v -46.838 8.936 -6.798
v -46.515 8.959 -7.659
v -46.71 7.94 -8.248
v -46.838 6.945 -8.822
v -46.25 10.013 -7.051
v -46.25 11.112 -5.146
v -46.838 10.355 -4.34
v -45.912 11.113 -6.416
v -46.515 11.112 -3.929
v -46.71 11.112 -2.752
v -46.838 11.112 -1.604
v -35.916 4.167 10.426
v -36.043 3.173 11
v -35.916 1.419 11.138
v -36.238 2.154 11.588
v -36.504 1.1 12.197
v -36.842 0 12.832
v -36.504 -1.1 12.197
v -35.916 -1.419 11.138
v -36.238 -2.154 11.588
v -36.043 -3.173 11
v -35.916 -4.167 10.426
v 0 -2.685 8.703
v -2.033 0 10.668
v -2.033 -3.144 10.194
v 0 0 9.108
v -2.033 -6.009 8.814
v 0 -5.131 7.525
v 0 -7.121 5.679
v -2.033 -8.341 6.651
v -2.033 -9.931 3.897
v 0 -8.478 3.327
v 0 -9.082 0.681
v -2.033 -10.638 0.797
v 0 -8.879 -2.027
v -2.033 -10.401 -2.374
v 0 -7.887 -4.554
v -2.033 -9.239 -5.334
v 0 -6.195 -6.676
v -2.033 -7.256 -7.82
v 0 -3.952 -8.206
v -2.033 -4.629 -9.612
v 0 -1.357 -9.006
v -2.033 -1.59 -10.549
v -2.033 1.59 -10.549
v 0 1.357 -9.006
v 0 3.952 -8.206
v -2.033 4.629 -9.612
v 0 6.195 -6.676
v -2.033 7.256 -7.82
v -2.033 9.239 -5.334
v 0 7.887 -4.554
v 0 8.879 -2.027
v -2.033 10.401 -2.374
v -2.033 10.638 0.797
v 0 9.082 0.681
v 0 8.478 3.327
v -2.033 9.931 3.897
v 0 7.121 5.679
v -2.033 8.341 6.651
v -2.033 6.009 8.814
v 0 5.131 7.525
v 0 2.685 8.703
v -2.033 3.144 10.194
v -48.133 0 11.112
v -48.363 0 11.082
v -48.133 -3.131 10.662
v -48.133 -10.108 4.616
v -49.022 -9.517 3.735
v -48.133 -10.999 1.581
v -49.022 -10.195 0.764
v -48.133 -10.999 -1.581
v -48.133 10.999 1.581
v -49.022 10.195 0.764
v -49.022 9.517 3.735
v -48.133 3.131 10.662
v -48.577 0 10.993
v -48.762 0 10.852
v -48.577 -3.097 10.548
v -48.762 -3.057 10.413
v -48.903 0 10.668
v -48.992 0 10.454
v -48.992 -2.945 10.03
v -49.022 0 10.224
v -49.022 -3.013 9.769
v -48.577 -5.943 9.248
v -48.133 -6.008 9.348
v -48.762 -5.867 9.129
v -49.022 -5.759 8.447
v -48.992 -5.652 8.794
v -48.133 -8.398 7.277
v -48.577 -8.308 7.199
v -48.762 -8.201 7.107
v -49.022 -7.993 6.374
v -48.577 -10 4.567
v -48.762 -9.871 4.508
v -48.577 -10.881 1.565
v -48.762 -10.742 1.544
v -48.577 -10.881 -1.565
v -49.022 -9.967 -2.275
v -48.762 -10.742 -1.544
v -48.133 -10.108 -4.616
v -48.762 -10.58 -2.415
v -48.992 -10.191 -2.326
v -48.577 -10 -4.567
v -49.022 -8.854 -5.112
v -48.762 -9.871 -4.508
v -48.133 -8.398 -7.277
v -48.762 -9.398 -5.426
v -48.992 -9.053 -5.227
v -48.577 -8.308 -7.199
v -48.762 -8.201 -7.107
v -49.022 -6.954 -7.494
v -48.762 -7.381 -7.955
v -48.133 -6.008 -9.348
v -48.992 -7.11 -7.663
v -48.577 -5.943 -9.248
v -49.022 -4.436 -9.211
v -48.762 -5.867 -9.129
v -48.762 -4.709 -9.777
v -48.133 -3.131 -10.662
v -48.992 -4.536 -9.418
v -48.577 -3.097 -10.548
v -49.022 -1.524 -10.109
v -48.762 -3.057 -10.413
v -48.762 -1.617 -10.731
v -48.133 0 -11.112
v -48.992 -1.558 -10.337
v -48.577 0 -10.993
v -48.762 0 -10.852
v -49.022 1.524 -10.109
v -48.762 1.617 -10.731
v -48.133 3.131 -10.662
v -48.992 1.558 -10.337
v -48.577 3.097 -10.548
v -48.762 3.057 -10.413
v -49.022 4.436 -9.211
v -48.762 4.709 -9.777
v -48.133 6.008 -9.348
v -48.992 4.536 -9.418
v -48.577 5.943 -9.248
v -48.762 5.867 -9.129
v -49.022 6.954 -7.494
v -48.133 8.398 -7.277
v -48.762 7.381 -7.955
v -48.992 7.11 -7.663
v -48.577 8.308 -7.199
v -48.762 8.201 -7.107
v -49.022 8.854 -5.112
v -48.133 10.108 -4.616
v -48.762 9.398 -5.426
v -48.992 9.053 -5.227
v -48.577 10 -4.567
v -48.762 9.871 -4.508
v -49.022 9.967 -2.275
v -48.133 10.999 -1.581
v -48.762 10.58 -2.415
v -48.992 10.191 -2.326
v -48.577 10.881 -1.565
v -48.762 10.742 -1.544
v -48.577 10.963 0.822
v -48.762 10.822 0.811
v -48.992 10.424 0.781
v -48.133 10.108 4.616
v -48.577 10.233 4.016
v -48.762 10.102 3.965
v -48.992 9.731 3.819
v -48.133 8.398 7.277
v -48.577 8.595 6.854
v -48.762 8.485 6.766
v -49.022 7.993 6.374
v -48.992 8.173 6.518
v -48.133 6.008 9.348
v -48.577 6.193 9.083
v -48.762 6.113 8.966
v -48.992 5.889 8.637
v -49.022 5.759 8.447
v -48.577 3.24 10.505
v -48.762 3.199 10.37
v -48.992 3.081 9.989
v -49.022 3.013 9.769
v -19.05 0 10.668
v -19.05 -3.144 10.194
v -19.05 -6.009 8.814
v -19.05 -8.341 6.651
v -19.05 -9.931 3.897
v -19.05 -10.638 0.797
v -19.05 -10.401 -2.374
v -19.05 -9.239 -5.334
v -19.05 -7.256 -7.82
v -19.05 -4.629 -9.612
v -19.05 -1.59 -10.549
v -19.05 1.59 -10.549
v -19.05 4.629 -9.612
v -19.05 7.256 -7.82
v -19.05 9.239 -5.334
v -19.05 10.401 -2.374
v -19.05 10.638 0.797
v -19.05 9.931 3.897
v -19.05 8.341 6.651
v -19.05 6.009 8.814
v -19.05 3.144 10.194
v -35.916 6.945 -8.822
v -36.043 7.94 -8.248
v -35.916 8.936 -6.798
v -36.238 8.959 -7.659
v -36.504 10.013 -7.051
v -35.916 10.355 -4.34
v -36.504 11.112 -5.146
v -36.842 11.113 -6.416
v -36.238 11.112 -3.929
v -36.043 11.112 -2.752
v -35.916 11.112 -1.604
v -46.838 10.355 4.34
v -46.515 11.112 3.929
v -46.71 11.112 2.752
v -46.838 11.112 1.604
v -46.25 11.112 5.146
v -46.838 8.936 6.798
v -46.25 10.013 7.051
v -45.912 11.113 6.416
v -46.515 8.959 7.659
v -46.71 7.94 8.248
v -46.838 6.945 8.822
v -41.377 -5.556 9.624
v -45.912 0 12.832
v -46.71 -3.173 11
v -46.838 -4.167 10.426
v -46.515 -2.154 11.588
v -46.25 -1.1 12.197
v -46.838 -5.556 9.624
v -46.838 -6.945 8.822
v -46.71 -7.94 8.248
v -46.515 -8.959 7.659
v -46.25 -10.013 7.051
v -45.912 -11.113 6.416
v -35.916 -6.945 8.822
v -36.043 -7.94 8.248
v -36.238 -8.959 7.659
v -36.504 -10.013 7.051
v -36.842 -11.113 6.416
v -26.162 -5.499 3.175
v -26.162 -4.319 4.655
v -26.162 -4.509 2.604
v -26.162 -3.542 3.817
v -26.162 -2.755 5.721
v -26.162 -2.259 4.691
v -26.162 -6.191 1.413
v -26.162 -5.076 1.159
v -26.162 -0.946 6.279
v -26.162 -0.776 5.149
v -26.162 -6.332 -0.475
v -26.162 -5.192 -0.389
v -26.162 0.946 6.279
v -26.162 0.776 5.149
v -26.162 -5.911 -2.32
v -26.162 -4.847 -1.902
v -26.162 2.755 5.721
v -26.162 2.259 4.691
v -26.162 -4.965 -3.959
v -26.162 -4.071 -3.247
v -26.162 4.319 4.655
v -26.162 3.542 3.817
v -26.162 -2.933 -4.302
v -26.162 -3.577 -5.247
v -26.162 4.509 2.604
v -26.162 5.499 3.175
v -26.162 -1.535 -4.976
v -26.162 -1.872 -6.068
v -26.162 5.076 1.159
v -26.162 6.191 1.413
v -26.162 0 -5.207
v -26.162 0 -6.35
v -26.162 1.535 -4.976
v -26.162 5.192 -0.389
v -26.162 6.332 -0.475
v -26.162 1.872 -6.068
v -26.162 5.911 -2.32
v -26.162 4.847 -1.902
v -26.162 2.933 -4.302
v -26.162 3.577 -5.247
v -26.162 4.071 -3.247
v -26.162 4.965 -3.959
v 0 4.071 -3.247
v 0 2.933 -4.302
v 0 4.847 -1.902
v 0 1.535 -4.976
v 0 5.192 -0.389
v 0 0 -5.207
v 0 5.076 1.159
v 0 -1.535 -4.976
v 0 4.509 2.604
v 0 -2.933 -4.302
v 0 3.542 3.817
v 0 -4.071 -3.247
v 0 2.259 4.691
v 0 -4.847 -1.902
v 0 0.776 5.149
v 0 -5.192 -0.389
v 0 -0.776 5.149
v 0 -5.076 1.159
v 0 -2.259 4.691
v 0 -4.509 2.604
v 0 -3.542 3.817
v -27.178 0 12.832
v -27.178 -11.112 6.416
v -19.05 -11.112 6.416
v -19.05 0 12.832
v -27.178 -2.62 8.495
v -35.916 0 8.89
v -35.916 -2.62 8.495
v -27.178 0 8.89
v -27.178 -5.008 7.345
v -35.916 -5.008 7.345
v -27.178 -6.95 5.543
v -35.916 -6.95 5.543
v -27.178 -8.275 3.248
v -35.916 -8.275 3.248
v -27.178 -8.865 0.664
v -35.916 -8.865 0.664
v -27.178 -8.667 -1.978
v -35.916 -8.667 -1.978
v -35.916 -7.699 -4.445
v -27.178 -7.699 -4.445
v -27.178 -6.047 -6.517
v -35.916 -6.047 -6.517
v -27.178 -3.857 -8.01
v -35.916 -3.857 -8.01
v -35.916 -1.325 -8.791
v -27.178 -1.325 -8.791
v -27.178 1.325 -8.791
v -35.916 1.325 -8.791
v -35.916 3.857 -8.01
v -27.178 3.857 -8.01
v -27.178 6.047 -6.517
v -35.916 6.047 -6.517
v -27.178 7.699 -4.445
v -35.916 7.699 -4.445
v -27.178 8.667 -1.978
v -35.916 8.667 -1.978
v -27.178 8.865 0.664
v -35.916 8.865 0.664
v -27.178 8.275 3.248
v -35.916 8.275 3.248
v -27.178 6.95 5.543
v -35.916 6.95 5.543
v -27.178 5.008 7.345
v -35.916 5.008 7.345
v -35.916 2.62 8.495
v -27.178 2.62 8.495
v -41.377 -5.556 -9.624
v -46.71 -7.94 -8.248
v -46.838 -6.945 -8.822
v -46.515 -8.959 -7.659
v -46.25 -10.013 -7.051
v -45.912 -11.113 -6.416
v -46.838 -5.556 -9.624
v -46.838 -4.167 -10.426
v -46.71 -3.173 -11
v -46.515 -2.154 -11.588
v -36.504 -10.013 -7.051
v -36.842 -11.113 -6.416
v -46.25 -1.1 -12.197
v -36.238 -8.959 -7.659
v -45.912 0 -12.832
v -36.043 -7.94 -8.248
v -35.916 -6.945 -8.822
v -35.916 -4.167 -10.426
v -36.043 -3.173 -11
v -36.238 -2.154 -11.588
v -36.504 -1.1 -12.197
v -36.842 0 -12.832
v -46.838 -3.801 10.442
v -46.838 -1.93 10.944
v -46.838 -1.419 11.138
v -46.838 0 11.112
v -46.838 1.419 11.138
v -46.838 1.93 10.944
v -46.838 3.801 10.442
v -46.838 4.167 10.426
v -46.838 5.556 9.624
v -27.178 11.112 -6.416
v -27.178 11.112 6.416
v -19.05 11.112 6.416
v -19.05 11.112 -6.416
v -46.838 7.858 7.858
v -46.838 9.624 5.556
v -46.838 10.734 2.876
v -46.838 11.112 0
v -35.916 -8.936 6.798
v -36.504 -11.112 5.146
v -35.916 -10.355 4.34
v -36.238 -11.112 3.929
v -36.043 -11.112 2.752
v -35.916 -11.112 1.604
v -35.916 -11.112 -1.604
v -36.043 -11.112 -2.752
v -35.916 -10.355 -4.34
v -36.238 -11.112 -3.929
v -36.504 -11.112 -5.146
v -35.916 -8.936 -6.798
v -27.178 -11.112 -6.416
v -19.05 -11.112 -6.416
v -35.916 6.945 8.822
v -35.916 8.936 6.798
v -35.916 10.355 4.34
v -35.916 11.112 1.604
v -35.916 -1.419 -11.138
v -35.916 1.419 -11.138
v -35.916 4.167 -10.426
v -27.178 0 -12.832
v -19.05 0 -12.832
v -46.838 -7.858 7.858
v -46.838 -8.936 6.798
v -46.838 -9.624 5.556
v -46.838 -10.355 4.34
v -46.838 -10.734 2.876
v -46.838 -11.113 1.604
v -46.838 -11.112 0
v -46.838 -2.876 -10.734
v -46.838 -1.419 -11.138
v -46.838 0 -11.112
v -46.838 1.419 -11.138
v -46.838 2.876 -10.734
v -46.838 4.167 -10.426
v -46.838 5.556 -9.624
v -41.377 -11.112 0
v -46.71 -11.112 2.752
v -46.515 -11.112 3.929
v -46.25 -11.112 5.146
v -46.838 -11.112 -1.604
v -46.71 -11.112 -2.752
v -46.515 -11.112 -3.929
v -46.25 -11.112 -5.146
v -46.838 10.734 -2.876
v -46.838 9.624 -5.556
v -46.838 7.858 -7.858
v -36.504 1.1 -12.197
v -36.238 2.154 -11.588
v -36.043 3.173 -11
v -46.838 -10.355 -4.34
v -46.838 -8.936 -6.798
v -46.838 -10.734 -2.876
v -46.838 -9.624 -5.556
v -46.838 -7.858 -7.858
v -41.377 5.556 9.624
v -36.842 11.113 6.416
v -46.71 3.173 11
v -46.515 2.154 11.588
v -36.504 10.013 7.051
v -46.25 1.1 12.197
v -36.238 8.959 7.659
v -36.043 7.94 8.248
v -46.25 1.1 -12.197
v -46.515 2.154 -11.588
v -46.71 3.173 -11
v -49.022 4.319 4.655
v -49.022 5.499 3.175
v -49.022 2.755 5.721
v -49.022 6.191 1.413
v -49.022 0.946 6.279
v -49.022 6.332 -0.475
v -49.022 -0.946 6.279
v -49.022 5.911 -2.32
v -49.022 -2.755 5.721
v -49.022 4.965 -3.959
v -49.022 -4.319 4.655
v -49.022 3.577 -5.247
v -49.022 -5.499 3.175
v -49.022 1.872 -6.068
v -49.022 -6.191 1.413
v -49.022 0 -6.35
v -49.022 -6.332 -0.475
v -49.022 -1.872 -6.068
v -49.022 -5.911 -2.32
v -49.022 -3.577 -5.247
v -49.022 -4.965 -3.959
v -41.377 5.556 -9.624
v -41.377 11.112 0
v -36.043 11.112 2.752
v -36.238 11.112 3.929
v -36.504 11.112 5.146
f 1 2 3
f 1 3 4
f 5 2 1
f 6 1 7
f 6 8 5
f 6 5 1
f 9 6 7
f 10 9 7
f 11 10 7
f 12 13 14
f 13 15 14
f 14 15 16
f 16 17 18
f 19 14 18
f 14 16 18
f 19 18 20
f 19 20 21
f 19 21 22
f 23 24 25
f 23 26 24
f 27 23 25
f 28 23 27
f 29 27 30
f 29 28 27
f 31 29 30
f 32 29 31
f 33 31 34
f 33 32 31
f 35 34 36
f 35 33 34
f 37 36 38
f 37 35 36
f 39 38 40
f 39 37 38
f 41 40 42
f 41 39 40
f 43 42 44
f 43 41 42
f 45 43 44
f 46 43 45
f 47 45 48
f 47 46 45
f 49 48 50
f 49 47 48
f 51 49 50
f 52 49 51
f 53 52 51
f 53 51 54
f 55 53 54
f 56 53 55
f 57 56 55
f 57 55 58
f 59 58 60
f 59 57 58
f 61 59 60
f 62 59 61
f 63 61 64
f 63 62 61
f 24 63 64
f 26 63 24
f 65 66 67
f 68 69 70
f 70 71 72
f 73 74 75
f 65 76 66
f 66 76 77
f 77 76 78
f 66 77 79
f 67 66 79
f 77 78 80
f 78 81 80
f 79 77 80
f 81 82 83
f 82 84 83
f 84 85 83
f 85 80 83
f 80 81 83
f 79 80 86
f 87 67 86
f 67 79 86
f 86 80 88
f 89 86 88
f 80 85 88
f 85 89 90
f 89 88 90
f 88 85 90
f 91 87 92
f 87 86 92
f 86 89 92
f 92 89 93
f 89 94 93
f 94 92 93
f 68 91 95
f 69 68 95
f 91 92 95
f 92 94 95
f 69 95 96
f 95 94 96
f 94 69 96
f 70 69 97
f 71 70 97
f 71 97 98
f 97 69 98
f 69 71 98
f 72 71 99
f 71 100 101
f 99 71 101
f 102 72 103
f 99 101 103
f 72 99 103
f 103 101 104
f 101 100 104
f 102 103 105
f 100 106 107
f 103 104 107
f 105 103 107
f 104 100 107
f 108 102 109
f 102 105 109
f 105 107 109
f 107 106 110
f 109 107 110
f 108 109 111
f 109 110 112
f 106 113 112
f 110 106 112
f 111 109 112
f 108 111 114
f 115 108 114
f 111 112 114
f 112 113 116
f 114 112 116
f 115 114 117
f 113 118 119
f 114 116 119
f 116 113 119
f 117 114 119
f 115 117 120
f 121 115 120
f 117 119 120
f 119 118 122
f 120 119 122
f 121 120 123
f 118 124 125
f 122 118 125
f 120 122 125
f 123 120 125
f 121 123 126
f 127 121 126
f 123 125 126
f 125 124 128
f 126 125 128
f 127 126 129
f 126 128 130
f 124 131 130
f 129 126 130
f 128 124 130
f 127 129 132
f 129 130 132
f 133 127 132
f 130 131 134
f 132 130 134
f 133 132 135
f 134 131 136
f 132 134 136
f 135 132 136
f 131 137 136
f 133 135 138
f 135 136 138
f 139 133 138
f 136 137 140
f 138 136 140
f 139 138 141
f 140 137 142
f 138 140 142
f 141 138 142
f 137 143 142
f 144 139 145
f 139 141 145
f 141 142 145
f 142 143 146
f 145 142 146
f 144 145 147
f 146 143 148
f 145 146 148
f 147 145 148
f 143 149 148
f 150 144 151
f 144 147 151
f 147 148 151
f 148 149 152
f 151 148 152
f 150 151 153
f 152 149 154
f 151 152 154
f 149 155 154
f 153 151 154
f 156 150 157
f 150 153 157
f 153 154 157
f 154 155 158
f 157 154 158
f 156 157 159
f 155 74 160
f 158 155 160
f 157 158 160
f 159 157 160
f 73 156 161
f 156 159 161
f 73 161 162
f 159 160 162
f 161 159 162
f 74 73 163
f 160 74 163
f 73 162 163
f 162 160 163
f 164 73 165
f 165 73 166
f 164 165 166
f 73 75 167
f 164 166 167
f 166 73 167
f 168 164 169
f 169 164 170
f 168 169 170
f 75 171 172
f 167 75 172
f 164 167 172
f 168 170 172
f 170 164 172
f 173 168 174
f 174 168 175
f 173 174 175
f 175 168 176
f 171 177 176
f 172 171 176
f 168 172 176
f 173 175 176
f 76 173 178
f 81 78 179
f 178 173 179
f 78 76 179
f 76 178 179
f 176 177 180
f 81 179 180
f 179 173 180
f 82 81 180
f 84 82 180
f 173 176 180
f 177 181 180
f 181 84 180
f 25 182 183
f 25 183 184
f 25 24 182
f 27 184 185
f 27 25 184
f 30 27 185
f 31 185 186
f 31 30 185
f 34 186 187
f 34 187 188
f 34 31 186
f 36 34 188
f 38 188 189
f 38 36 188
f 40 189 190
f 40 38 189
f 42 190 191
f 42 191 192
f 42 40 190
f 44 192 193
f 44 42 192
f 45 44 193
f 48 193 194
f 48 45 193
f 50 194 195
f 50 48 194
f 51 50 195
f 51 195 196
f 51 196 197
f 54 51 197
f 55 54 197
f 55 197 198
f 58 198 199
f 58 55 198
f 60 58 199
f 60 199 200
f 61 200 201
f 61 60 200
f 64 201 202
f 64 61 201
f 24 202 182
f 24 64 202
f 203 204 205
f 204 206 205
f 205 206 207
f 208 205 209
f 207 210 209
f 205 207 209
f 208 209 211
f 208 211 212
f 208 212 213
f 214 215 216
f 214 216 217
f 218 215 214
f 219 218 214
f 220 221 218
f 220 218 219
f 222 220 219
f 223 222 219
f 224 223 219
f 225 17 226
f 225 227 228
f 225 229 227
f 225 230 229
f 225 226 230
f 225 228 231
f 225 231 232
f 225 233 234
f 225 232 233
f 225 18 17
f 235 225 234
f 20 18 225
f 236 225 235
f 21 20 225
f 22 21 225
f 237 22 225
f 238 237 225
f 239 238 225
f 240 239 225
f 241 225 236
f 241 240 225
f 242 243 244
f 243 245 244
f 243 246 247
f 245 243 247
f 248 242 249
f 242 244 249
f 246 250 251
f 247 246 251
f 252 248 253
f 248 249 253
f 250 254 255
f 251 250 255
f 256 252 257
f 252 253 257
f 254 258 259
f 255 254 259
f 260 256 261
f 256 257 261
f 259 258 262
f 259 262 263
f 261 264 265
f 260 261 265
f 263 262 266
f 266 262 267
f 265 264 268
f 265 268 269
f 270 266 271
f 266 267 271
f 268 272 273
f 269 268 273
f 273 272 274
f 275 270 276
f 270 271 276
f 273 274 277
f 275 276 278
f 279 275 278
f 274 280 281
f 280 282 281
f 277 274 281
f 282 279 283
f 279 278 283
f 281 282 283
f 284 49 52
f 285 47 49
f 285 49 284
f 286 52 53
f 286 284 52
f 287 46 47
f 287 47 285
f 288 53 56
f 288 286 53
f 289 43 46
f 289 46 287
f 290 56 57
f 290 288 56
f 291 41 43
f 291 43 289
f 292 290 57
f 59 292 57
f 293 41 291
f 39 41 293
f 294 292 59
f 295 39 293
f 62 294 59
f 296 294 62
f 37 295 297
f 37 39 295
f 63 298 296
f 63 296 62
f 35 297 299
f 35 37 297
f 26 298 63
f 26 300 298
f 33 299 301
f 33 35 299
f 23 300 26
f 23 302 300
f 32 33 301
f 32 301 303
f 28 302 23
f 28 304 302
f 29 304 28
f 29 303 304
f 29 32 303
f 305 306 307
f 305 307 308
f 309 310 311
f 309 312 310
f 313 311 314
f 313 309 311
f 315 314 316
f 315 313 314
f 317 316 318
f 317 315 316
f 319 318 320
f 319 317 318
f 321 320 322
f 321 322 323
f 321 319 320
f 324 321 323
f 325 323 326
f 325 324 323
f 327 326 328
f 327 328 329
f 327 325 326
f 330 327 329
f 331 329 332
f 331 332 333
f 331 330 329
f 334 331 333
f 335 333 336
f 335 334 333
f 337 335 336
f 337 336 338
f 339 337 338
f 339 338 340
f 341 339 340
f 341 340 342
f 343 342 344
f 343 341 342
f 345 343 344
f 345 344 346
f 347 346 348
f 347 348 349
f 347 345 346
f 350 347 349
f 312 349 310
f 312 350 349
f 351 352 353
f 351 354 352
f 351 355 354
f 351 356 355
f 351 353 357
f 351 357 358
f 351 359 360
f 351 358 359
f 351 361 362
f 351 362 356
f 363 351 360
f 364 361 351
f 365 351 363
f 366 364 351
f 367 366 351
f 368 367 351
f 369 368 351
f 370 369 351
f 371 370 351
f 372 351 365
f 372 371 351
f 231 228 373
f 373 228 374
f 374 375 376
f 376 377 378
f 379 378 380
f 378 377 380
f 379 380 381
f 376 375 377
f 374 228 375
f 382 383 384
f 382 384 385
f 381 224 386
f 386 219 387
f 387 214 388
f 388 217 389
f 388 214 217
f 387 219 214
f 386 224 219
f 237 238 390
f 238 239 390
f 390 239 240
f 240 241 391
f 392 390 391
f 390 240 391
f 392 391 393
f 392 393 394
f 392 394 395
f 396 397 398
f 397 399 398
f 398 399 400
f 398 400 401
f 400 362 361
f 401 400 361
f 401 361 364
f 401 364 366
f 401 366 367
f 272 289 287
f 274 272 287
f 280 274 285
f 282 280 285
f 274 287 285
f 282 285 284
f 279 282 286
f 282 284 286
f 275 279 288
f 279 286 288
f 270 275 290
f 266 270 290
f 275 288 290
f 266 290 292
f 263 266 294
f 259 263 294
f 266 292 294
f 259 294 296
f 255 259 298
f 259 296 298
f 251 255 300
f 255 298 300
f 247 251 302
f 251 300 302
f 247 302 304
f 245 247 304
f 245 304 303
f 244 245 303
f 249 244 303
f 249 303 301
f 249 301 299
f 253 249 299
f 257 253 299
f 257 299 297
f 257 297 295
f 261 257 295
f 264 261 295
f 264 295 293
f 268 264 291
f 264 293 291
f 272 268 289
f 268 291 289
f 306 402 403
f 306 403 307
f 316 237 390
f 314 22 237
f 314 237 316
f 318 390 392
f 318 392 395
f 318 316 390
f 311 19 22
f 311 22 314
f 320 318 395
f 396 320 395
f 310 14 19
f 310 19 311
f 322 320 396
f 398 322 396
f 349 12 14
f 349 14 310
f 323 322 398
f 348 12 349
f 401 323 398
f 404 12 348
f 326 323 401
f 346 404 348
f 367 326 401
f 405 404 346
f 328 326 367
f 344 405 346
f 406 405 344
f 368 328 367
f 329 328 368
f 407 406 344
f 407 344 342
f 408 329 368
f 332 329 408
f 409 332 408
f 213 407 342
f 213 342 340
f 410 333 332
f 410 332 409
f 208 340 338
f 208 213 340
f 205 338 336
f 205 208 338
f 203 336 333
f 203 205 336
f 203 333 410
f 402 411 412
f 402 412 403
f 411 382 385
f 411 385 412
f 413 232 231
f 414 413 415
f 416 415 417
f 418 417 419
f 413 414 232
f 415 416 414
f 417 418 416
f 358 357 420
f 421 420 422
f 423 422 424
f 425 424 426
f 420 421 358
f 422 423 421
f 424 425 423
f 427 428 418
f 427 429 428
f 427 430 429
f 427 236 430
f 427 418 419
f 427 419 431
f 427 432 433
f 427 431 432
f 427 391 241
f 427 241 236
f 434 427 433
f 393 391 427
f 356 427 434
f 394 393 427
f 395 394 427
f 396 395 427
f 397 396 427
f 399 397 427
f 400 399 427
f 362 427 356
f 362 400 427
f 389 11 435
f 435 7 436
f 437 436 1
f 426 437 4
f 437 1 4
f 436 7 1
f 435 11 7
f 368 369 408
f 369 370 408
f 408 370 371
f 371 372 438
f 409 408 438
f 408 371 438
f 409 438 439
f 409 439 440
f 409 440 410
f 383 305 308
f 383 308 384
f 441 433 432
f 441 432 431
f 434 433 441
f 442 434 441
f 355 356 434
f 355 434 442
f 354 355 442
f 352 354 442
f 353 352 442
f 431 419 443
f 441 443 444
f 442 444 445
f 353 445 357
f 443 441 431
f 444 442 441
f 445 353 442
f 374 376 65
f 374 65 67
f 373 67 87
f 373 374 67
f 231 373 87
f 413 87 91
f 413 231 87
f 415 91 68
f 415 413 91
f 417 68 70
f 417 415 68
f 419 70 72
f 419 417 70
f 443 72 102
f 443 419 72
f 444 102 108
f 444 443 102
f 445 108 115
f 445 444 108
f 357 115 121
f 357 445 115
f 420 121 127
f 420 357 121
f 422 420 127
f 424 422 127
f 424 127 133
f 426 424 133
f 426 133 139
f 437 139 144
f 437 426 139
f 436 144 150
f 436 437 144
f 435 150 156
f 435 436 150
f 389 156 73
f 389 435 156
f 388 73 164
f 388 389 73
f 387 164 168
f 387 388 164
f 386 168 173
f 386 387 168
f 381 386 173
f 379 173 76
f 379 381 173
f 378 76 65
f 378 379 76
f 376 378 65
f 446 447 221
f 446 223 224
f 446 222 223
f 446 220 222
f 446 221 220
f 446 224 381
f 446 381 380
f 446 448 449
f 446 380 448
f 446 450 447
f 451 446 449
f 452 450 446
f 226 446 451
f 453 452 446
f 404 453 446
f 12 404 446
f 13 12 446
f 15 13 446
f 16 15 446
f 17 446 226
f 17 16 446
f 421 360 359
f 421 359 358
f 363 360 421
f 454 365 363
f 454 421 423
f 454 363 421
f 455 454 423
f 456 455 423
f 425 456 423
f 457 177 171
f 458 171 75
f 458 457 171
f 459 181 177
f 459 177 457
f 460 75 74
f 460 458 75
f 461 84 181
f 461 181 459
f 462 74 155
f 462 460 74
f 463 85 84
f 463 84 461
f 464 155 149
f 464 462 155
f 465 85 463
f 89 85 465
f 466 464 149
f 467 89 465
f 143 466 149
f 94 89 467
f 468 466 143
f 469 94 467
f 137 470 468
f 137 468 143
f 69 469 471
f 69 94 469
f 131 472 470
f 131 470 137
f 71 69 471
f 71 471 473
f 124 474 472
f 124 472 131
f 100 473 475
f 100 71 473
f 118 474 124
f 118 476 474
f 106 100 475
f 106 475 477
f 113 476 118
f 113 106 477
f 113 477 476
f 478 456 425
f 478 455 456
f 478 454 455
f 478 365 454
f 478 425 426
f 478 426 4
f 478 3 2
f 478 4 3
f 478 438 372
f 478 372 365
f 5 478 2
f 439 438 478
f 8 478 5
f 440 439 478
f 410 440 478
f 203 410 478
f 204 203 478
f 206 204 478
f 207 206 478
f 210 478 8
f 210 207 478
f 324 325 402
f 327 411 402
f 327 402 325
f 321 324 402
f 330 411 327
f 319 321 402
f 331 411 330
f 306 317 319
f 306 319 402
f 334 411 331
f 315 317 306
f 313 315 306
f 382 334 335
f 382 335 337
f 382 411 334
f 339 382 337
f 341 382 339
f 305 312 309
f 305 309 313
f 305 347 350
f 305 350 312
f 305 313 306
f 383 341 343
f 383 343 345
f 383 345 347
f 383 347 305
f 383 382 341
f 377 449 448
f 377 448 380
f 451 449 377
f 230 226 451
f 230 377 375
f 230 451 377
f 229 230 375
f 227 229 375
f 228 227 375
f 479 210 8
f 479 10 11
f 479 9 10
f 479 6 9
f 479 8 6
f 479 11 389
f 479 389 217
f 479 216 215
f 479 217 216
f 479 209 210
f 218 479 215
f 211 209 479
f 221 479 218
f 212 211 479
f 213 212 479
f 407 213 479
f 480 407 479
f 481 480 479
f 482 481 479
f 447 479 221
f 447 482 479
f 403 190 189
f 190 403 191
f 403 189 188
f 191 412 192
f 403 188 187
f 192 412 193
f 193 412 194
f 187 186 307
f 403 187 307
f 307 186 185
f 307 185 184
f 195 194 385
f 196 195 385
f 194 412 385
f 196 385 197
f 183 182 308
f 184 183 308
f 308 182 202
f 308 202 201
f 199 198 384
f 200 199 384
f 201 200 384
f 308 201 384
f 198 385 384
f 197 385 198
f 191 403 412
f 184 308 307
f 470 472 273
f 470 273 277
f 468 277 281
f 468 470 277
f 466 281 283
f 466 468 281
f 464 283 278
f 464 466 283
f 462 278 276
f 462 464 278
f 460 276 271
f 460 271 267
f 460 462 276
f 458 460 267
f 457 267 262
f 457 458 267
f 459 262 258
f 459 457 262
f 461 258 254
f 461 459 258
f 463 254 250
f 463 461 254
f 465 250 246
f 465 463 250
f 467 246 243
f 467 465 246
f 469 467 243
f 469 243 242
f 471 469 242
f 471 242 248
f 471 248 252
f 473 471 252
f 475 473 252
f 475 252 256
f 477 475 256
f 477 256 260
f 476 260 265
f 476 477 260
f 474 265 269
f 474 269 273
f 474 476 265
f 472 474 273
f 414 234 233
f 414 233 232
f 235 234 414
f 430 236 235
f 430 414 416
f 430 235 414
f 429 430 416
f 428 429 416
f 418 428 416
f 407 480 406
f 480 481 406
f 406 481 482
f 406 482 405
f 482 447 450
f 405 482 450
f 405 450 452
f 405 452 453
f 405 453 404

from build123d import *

# Parameters (mm, degrees)
HEX1_DEPTH         = 5.461
BODYFILLET_R       = 0.889
HEX2_DEPTH         = 8.128
DSCH_R             = 6.35
CUT_EXTRUDED_DEPTH = 22.86
SKETCH_E_R         = 5.207
CUT_EXTRUDEE_DEPTH = 26.162


with BuildPart() as part:
    # BodySch → Body (revolve)
    with BuildSketch(Plane.XY, mode=Mode.PRIVATE) as body_sk:
        Polygon((-49.022, 0), (-49.022, 11.1125), (-41.3766, 11.1125), (-41.3766, 8.89), (-27.178, 8.89), (-27.178, 10.668), (-2.033448841, 10.668), (0, 9.107679825), (0, 0), align=None)
    revolve(body_sk.sketch.rotate(Axis((-103.68469285, 0, 0), (1, 0, 0)), 90), axis=Axis((-103.68469285, 0, 0), (1, 0, 0)))

    # Hex1Sch_G → Hex1 (add, symmetric)
    with BuildSketch(Plane(origin=(-41.3766, 0, 0), x_dir=(0, 0, -1), z_dir=(1, 0, 0))):
        Polygon((12.831609733, 0), (6.415804866, 11.1125), (-6.415804866, 11.1125), (-12.831609733, 0), (-6.415804866, -11.1125), (6.415804866, -11.1125), align=None)
    extrude(amount=HEX1_DEPTH, both=True)

    # BodyFillet
    bodyfillet_edges = [part.edges().sort_by_distance(p)[0] for p in [
        (-49.022, 0, -11.1125),
    ]]
    fillet(bodyfillet_edges, radius=BODYFILLET_R)

    # HexfilletSch → Hexfillet (revolve, cut)
    with BuildSketch(Plane(origin=(0, 0, 0), x_dir=(1, 0, 0), z_dir=(0, 1, 0)), mode=Mode.PRIVATE) as hexfillet_sk:
        Polygon((-46.8376, 11.227658516), (-45.911558333, 12.831609733), (-46.8376, 12.831609733), align=None)
        Polygon((-35.9156, 11.227658516), (-36.841641667, 12.831609733), (-35.9156, 12.831609733), align=None)
    revolve(hexfillet_sk.sketch.rotate(Axis((-41.994761709, 0, 0), (1, 0, 0)), 150), axis=Axis((-41.994761709, 0, 0), (1, 0, 0)), mode=Mode.SUBTRACT)

    # Hex2Sch_F → Hex2 (add)
    with BuildSketch(Plane.ZY.offset(27.178)):
        Polygon((12.831609733, 0), (6.415804866, 11.1125), (-6.415804866, 11.1125), (-12.831609733, 0), (-6.415804866, -11.1125), (6.415804866, -11.1125), align=None)
    extrude(amount=-HEX2_DEPTH)

    # DSch → Cut-ExtrudeD (cut)
    with BuildSketch(Plane(origin=(-49.022, 0, 0), x_dir=(0, 0, -1), z_dir=(1, 0, 0))):
        Circle(DSCH_R)
    extrude(amount=CUT_EXTRUDED_DEPTH, mode=Mode.SUBTRACT)

    # Sketch E → Cut-ExtrudeE (cut)
    with BuildSketch(Plane(origin=(0, 0, 0), x_dir=(0, 0, -1), z_dir=(1, 0, 0))):
        Circle(SKETCH_E_R)
    extrude(amount=-CUT_EXTRUDEE_DEPTH, mode=Mode.SUBTRACT)


solid = part.part
